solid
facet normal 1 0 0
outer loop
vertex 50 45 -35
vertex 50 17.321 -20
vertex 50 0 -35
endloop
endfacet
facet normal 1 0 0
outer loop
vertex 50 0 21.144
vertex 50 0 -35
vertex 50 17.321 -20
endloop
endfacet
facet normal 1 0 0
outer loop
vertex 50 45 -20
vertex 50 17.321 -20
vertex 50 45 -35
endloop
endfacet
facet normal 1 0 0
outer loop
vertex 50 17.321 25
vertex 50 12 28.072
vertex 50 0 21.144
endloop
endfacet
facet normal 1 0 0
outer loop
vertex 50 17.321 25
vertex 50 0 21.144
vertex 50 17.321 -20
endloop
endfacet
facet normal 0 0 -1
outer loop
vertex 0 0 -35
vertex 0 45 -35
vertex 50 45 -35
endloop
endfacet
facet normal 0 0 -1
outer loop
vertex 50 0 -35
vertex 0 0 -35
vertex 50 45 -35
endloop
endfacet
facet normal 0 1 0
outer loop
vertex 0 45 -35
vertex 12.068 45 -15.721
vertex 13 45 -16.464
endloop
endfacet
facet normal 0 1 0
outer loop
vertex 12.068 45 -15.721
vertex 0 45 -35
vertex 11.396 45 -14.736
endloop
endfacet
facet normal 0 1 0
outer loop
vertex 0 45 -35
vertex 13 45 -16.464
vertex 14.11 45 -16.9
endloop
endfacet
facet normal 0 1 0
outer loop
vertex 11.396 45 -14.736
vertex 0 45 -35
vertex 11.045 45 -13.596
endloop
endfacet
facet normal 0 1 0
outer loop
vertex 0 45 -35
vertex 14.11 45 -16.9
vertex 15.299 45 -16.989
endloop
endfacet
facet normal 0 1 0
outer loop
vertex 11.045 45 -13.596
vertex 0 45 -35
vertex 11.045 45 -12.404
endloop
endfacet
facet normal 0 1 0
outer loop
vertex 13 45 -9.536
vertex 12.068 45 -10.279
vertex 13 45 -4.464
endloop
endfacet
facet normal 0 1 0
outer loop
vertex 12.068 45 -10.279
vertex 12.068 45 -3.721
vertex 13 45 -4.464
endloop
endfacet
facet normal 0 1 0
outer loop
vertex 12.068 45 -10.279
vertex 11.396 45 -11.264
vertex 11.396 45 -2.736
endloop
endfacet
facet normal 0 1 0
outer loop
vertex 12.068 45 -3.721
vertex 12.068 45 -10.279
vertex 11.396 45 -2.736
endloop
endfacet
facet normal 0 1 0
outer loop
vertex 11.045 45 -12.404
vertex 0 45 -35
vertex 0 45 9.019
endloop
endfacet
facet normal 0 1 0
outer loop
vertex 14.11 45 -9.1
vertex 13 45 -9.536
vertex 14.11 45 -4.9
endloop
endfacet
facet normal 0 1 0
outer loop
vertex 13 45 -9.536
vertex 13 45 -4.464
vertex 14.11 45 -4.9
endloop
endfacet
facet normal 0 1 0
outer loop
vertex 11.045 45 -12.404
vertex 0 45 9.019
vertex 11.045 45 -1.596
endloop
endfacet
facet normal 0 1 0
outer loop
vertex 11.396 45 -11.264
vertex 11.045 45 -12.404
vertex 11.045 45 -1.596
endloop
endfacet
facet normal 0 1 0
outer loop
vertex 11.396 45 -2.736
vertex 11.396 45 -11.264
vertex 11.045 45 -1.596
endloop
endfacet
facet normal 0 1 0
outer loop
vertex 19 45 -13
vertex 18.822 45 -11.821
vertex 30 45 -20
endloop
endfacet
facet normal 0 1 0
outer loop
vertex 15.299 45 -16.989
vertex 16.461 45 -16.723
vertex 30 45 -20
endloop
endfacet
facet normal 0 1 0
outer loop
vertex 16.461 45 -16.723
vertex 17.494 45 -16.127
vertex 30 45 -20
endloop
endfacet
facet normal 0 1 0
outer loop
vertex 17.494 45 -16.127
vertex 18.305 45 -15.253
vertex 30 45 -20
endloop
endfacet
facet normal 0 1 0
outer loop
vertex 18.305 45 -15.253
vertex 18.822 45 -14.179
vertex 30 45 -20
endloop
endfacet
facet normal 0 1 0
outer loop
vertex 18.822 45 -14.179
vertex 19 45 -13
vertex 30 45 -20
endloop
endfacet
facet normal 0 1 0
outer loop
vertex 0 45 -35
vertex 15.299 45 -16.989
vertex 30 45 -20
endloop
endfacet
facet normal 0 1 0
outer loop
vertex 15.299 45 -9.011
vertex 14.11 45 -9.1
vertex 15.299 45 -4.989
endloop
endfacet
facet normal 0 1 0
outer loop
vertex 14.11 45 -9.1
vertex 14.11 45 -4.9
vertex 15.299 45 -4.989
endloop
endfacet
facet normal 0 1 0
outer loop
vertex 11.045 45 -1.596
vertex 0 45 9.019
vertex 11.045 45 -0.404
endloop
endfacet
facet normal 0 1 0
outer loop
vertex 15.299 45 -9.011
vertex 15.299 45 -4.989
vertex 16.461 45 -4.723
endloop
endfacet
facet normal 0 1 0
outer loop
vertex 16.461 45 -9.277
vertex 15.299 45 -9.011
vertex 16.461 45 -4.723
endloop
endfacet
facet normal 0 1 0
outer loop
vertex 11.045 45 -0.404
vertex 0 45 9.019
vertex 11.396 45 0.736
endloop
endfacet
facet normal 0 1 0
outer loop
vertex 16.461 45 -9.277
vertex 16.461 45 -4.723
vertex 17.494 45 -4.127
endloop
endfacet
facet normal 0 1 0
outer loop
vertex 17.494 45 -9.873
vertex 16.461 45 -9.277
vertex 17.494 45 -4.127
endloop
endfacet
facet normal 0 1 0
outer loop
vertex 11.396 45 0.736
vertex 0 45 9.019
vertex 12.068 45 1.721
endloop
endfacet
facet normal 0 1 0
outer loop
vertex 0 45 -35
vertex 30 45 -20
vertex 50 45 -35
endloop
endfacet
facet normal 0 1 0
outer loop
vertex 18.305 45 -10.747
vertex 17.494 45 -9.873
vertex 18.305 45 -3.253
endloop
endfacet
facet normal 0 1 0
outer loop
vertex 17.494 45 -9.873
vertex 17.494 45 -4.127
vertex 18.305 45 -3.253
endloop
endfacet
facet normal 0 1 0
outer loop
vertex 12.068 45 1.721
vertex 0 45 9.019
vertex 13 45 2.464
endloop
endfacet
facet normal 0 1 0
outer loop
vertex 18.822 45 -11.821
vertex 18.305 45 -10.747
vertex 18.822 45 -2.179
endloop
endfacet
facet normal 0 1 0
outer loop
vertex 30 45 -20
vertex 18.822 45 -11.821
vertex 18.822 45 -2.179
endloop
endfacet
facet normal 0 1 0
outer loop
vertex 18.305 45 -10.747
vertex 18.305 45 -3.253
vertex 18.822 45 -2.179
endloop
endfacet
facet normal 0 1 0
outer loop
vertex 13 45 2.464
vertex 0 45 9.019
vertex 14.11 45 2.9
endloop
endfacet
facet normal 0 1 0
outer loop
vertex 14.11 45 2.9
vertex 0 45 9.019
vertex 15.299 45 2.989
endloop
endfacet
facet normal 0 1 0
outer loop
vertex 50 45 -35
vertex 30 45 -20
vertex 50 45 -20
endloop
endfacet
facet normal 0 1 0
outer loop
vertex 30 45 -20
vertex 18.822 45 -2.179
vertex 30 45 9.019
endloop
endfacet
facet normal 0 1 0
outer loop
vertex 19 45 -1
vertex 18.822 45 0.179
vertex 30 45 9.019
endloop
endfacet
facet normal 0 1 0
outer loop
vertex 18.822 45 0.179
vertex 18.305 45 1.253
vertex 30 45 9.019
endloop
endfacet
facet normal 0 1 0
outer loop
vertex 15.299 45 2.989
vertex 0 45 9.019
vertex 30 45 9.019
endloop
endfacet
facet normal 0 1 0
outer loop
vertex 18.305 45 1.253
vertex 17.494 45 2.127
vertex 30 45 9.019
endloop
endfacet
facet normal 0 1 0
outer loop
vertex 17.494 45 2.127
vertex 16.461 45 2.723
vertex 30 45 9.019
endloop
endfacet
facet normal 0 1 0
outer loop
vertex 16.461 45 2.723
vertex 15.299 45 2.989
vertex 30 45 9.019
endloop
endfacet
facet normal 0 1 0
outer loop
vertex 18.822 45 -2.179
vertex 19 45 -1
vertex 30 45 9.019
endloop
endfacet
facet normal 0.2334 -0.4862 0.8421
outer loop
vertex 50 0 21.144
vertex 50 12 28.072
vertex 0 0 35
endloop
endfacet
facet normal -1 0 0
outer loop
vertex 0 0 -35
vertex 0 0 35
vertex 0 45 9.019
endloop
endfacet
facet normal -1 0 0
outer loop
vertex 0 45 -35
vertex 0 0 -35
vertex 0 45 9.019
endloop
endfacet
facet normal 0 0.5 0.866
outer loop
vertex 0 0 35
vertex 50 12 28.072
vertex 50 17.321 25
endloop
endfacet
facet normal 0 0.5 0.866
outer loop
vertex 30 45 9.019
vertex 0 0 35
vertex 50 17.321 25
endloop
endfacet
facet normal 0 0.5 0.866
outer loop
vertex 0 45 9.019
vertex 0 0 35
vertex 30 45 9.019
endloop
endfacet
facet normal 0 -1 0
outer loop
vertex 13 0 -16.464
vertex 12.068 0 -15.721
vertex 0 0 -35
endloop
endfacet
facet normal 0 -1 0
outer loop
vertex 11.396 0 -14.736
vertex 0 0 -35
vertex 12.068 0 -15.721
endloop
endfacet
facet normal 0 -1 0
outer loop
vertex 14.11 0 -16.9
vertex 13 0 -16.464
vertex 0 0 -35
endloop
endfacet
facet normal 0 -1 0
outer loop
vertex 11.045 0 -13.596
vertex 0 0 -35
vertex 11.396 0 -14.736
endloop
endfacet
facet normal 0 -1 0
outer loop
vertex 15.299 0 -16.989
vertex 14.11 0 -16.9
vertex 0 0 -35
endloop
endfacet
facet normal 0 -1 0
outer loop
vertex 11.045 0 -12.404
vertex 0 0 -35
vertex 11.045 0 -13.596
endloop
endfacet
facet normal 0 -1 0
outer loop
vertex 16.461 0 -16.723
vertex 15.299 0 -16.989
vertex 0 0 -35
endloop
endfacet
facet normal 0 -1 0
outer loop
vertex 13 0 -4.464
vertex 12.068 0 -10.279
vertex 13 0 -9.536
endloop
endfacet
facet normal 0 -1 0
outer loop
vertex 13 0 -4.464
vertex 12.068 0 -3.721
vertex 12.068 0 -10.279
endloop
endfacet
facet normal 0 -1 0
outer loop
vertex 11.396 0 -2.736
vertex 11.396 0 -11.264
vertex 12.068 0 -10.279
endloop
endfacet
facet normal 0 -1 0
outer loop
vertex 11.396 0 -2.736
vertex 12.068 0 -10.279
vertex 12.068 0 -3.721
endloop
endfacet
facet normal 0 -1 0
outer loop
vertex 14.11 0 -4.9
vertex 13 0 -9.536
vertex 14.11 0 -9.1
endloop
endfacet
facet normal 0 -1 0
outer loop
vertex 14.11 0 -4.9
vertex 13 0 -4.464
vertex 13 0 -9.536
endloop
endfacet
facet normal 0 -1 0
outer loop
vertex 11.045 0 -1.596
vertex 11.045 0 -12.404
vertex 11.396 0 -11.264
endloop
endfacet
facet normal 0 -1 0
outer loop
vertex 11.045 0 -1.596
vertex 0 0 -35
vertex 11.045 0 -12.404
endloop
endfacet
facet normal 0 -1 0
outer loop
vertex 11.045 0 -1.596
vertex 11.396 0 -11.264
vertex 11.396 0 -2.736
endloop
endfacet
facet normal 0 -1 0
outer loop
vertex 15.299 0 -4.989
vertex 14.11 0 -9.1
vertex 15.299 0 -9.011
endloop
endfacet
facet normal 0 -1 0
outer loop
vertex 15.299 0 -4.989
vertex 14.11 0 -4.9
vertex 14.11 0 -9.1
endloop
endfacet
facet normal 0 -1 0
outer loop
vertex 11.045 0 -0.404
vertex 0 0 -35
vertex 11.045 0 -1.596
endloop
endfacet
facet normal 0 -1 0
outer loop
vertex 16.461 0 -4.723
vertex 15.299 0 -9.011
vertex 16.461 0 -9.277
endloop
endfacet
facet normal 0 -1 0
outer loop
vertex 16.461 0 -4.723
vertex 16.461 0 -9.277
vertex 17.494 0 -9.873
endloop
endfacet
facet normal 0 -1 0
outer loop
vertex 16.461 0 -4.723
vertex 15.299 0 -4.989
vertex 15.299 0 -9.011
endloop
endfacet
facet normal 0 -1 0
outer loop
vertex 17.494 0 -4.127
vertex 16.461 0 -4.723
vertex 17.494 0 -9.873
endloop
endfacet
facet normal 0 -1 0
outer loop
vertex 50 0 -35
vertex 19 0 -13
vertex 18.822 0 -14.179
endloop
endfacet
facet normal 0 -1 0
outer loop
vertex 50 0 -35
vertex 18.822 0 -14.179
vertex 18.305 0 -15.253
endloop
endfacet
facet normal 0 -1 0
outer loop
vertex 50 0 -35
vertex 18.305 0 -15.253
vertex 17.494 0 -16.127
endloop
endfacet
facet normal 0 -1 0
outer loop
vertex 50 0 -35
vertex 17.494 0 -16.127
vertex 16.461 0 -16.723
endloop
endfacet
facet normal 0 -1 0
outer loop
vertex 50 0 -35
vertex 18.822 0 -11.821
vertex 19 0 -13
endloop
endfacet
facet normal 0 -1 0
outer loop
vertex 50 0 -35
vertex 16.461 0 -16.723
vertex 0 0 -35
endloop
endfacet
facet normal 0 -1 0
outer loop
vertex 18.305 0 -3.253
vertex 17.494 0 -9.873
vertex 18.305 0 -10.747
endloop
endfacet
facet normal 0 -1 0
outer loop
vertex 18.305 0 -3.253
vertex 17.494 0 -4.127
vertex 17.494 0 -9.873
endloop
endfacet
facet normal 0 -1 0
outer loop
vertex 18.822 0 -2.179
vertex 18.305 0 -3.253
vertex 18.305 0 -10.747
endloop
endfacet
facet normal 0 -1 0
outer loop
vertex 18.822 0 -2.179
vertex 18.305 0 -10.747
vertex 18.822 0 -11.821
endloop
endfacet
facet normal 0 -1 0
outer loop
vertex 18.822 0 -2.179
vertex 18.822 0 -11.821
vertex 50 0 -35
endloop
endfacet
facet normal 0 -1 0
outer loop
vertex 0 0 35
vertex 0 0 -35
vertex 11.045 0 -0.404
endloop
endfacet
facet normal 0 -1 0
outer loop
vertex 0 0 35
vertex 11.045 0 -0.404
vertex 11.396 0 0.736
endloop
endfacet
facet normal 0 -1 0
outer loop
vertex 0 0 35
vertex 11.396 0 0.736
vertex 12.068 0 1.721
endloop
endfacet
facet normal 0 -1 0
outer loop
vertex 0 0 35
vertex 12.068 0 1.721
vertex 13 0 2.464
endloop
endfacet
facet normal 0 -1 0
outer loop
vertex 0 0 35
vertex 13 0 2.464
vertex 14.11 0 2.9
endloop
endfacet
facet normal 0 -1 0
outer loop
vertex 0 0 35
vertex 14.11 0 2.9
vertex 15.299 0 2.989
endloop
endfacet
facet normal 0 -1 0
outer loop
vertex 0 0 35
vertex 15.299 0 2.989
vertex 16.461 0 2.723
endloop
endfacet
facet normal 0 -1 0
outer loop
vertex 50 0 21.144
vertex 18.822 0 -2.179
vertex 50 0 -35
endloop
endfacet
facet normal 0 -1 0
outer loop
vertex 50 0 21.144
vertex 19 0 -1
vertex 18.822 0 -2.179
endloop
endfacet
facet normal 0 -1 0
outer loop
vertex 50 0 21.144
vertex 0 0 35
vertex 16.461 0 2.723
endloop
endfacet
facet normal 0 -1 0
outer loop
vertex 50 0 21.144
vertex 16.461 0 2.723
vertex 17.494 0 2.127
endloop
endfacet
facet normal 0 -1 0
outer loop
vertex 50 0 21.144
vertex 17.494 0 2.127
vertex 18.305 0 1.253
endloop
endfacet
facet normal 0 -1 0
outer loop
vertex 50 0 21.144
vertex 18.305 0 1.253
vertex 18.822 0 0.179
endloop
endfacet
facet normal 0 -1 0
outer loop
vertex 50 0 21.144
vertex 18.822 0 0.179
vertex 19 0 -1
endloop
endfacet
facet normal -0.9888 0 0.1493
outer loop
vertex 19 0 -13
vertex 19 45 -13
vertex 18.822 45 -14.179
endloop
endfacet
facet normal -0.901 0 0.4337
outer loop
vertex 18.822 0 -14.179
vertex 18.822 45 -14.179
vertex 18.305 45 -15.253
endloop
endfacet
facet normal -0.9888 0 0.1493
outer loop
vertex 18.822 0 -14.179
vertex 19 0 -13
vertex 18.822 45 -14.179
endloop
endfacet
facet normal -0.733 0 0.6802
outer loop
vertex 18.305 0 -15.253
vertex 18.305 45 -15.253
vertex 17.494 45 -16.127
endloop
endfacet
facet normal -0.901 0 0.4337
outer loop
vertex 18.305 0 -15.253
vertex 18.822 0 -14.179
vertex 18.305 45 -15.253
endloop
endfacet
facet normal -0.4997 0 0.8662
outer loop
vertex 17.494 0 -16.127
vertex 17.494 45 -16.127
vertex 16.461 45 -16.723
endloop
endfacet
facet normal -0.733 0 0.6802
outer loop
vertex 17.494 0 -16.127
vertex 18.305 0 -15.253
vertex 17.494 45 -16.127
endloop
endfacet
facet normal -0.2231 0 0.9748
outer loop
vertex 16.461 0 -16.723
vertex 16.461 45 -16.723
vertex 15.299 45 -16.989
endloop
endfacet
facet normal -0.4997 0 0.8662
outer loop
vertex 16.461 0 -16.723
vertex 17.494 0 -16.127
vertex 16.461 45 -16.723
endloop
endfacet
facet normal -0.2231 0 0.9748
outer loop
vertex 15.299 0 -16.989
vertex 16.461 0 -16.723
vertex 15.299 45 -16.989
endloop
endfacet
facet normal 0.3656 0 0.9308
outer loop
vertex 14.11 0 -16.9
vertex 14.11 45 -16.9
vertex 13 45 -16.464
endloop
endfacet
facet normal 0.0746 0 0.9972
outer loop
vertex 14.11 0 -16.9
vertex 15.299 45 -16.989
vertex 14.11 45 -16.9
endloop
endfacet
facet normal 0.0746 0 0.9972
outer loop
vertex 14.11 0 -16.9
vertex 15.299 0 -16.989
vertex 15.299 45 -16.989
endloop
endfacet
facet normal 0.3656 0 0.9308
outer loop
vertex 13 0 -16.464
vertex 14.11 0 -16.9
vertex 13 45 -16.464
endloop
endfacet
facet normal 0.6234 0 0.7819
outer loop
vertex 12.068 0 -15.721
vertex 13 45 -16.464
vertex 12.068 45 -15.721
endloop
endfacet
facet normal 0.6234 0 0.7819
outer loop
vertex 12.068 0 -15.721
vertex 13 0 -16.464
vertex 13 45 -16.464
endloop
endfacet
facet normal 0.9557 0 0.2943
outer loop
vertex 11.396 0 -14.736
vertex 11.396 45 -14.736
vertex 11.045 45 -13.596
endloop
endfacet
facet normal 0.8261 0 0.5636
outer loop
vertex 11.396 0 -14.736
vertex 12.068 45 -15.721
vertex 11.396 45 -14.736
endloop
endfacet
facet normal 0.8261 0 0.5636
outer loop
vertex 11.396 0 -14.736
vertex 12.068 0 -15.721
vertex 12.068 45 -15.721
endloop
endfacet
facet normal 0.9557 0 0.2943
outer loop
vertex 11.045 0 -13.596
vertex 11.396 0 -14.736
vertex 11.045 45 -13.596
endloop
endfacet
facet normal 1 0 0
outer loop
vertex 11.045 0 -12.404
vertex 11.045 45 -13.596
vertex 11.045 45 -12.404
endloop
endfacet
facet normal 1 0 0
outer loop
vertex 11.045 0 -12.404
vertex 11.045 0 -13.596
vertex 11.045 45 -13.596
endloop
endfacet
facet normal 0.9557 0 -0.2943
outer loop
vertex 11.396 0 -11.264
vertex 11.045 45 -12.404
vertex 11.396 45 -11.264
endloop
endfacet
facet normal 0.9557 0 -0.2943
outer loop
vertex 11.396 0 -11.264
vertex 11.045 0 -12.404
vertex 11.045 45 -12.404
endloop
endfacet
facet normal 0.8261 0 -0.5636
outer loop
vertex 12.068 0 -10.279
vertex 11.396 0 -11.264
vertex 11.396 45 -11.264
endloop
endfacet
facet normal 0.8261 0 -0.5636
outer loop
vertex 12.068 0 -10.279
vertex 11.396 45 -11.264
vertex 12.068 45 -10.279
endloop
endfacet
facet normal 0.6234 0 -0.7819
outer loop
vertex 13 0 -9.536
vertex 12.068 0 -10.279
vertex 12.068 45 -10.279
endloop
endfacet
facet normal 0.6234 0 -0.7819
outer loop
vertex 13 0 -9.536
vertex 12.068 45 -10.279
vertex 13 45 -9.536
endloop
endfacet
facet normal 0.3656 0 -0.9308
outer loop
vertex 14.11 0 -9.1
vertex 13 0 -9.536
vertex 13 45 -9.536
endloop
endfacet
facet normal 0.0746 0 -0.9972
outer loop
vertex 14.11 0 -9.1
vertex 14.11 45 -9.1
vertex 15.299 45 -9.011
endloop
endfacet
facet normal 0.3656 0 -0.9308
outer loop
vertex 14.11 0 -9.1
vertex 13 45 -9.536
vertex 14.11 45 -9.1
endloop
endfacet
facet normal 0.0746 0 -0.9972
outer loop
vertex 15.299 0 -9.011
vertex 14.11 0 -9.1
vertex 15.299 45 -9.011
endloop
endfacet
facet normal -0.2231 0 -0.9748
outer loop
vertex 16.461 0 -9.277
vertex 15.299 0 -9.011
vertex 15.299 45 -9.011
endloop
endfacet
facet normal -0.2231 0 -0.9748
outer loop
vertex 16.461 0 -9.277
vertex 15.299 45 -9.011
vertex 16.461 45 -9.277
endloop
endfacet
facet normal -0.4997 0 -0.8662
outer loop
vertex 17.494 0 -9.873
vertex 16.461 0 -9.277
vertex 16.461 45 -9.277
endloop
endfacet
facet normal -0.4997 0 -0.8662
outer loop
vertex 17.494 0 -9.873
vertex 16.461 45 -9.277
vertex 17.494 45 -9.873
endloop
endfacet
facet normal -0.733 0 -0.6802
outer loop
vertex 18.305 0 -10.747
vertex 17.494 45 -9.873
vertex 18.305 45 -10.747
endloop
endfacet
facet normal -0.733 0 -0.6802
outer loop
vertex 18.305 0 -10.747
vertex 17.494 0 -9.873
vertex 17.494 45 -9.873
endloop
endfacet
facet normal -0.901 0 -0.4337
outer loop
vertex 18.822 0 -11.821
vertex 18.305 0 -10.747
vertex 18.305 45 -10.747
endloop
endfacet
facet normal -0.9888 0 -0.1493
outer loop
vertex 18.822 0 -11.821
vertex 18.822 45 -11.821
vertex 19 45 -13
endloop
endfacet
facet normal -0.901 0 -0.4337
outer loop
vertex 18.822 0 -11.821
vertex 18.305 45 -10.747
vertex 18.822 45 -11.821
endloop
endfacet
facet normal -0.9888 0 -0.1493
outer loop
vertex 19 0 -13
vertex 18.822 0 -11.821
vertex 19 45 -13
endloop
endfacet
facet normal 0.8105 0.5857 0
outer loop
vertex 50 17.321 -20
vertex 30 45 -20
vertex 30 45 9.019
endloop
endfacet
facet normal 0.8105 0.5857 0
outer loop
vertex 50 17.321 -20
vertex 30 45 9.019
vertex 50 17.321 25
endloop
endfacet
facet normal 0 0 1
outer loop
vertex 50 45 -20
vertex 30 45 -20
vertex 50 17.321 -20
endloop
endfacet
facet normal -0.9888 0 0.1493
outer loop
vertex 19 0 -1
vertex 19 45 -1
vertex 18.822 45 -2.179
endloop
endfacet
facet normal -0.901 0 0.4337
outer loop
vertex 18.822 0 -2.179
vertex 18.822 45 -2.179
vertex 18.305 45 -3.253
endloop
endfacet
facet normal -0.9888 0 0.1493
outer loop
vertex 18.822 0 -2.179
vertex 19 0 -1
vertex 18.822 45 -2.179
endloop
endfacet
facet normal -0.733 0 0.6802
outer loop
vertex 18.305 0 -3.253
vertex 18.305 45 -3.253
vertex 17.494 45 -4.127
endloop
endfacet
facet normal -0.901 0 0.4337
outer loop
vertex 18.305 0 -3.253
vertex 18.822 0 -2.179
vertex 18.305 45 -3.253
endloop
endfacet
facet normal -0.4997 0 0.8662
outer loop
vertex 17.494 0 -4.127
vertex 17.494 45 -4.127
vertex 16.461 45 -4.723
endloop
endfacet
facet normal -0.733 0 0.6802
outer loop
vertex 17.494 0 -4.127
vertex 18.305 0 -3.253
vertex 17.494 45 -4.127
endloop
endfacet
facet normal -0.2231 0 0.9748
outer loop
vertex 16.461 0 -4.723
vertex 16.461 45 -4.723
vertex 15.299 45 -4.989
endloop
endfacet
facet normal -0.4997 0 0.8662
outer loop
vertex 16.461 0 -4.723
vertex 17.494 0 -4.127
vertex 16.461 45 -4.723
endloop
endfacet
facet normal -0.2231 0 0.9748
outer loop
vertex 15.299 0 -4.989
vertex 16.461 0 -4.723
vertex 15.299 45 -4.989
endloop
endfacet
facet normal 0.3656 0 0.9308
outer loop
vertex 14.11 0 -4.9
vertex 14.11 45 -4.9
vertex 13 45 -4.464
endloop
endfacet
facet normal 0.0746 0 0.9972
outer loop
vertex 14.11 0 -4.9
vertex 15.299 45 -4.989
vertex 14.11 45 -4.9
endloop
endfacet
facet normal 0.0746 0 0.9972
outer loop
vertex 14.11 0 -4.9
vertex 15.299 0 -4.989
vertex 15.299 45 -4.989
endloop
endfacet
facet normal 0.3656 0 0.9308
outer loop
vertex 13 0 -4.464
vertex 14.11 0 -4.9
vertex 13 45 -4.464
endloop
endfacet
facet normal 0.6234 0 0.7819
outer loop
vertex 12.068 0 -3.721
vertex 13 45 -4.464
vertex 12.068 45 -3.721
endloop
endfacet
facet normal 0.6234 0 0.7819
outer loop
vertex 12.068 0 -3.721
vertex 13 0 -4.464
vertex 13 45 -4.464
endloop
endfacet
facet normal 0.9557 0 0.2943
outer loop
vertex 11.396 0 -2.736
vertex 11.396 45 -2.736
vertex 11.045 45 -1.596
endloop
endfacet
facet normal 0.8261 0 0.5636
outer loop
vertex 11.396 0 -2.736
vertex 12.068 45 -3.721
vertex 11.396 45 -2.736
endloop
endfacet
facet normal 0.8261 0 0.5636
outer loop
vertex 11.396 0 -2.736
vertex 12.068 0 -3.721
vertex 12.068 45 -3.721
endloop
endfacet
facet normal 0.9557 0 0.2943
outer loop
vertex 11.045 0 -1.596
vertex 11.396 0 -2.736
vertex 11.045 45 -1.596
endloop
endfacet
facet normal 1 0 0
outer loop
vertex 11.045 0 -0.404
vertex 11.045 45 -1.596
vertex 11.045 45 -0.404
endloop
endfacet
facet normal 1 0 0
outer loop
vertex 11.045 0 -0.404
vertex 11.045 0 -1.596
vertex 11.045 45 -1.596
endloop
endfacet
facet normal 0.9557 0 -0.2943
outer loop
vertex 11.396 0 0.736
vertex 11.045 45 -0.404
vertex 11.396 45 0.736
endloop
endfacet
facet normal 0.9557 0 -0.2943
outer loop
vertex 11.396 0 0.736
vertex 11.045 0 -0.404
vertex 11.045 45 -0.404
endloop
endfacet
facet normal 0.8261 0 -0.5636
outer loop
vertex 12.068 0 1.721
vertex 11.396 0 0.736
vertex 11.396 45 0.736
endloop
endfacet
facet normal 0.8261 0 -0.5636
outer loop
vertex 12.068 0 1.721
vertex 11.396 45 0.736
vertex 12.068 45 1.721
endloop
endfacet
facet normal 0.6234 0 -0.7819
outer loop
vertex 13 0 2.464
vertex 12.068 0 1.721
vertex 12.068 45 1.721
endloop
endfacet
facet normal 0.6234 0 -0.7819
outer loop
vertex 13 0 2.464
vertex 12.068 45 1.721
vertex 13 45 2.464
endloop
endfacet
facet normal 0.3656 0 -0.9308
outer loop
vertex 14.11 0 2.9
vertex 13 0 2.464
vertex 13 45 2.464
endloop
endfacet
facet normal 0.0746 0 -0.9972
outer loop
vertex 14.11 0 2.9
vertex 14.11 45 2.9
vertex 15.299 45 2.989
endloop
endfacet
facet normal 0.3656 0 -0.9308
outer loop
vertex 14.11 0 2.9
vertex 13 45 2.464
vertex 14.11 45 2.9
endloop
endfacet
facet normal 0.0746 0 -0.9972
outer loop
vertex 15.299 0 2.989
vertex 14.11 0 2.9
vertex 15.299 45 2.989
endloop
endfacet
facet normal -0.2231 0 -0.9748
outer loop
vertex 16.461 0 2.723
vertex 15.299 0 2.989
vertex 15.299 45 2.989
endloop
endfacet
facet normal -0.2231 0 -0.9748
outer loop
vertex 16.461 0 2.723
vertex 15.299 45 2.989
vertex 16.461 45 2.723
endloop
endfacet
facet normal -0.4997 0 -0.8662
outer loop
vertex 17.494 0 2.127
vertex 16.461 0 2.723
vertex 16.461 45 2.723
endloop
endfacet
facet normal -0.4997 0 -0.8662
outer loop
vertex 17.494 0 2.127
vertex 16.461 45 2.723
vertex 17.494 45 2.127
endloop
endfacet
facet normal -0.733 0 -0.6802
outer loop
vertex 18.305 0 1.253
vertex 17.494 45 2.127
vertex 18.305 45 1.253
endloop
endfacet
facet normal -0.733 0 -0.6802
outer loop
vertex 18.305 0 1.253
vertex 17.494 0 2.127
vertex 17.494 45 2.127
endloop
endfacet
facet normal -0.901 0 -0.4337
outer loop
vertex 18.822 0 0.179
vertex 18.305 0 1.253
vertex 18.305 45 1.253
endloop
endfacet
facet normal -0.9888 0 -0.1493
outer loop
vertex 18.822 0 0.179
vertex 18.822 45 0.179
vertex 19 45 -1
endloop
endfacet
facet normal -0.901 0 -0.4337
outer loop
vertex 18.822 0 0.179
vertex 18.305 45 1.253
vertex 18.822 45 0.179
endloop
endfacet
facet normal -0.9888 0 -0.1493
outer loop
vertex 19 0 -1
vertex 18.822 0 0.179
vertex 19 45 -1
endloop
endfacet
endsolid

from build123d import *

# Parameters (mm, degrees)
SKETCH1_W           = 50
SKETCH1_H           = 45
BOSS_EXTRUDE1_DEPTH = 35
CUT_EXTRUDE1_DEPTH  = 51
CUT_EXTRUDE2_DEPTH  = 70
SKETCH20_R          = 4
CUT_EXTRUDE5_DEPTH  = 46
CUT_EXTRUDE6_DEPTH  = 56


with BuildPart() as part:
    # Sketch1 → Boss-Extrude1 (new body, symmetric)
    with BuildSketch(Plane.XY):
        with Locations((25, 22.5)):
            Rectangle(SKETCH1_W, SKETCH1_H)
    extrude(amount=BOSS_EXTRUDE1_DEPTH, both=True)

    # Sketch3 → Cut-Extrude1 (cut, through all)
    with BuildSketch(Plane(origin=(0, 0, 0), x_dir=(0, 0, -1), z_dir=(1, 0, 0))):
        Polygon((-35, 45), (-35, 0), (-9.019237886, 45), align=None)
    extrude(amount=CUT_EXTRUDE1_DEPTH, mode=Mode.SUBTRACT)

    # Sketch9 → Cut-Extrude2 (cut, along a direction that is not the sketch's normal)
    with BuildSketch(Plane(origin=(0, 15.155444566, 26.25), x_dir=(1, 0, 0), z_dir=(0, 0.5, 0.866025404))):
        Polygon((50, -17.5), (50, -3.643593539), (0, -17.5), align=None)
    extrude(amount=-CUT_EXTRUDE2_DEPTH, dir=(0, 0.866025404, 0.5), mode=Mode.SUBTRACT)

    # Sketch20 → Cut-Extrude5 (cut, through all)
    with BuildSketch(Plane(origin=(0, 0, 0), x_dir=(1, 0, 0), z_dir=(0, 1, 0))):
        with Locations((15, 13)):
            Circle(SKETCH20_R)
        with Locations((15, 1)):
            Circle(SKETCH20_R)
    extrude(amount=CUT_EXTRUDE5_DEPTH, mode=Mode.SUBTRACT)

    # Sketch23 → Cut-Extrude6 (cut, through all)
    with BuildSketch(Plane.XY.offset(-20)):
        Polygon((50, 45), (30, 45), (50, 17.320508076), align=None)
    extrude(amount=CUT_EXTRUDE6_DEPTH, mode=Mode.SUBTRACT)


solid = part.part
